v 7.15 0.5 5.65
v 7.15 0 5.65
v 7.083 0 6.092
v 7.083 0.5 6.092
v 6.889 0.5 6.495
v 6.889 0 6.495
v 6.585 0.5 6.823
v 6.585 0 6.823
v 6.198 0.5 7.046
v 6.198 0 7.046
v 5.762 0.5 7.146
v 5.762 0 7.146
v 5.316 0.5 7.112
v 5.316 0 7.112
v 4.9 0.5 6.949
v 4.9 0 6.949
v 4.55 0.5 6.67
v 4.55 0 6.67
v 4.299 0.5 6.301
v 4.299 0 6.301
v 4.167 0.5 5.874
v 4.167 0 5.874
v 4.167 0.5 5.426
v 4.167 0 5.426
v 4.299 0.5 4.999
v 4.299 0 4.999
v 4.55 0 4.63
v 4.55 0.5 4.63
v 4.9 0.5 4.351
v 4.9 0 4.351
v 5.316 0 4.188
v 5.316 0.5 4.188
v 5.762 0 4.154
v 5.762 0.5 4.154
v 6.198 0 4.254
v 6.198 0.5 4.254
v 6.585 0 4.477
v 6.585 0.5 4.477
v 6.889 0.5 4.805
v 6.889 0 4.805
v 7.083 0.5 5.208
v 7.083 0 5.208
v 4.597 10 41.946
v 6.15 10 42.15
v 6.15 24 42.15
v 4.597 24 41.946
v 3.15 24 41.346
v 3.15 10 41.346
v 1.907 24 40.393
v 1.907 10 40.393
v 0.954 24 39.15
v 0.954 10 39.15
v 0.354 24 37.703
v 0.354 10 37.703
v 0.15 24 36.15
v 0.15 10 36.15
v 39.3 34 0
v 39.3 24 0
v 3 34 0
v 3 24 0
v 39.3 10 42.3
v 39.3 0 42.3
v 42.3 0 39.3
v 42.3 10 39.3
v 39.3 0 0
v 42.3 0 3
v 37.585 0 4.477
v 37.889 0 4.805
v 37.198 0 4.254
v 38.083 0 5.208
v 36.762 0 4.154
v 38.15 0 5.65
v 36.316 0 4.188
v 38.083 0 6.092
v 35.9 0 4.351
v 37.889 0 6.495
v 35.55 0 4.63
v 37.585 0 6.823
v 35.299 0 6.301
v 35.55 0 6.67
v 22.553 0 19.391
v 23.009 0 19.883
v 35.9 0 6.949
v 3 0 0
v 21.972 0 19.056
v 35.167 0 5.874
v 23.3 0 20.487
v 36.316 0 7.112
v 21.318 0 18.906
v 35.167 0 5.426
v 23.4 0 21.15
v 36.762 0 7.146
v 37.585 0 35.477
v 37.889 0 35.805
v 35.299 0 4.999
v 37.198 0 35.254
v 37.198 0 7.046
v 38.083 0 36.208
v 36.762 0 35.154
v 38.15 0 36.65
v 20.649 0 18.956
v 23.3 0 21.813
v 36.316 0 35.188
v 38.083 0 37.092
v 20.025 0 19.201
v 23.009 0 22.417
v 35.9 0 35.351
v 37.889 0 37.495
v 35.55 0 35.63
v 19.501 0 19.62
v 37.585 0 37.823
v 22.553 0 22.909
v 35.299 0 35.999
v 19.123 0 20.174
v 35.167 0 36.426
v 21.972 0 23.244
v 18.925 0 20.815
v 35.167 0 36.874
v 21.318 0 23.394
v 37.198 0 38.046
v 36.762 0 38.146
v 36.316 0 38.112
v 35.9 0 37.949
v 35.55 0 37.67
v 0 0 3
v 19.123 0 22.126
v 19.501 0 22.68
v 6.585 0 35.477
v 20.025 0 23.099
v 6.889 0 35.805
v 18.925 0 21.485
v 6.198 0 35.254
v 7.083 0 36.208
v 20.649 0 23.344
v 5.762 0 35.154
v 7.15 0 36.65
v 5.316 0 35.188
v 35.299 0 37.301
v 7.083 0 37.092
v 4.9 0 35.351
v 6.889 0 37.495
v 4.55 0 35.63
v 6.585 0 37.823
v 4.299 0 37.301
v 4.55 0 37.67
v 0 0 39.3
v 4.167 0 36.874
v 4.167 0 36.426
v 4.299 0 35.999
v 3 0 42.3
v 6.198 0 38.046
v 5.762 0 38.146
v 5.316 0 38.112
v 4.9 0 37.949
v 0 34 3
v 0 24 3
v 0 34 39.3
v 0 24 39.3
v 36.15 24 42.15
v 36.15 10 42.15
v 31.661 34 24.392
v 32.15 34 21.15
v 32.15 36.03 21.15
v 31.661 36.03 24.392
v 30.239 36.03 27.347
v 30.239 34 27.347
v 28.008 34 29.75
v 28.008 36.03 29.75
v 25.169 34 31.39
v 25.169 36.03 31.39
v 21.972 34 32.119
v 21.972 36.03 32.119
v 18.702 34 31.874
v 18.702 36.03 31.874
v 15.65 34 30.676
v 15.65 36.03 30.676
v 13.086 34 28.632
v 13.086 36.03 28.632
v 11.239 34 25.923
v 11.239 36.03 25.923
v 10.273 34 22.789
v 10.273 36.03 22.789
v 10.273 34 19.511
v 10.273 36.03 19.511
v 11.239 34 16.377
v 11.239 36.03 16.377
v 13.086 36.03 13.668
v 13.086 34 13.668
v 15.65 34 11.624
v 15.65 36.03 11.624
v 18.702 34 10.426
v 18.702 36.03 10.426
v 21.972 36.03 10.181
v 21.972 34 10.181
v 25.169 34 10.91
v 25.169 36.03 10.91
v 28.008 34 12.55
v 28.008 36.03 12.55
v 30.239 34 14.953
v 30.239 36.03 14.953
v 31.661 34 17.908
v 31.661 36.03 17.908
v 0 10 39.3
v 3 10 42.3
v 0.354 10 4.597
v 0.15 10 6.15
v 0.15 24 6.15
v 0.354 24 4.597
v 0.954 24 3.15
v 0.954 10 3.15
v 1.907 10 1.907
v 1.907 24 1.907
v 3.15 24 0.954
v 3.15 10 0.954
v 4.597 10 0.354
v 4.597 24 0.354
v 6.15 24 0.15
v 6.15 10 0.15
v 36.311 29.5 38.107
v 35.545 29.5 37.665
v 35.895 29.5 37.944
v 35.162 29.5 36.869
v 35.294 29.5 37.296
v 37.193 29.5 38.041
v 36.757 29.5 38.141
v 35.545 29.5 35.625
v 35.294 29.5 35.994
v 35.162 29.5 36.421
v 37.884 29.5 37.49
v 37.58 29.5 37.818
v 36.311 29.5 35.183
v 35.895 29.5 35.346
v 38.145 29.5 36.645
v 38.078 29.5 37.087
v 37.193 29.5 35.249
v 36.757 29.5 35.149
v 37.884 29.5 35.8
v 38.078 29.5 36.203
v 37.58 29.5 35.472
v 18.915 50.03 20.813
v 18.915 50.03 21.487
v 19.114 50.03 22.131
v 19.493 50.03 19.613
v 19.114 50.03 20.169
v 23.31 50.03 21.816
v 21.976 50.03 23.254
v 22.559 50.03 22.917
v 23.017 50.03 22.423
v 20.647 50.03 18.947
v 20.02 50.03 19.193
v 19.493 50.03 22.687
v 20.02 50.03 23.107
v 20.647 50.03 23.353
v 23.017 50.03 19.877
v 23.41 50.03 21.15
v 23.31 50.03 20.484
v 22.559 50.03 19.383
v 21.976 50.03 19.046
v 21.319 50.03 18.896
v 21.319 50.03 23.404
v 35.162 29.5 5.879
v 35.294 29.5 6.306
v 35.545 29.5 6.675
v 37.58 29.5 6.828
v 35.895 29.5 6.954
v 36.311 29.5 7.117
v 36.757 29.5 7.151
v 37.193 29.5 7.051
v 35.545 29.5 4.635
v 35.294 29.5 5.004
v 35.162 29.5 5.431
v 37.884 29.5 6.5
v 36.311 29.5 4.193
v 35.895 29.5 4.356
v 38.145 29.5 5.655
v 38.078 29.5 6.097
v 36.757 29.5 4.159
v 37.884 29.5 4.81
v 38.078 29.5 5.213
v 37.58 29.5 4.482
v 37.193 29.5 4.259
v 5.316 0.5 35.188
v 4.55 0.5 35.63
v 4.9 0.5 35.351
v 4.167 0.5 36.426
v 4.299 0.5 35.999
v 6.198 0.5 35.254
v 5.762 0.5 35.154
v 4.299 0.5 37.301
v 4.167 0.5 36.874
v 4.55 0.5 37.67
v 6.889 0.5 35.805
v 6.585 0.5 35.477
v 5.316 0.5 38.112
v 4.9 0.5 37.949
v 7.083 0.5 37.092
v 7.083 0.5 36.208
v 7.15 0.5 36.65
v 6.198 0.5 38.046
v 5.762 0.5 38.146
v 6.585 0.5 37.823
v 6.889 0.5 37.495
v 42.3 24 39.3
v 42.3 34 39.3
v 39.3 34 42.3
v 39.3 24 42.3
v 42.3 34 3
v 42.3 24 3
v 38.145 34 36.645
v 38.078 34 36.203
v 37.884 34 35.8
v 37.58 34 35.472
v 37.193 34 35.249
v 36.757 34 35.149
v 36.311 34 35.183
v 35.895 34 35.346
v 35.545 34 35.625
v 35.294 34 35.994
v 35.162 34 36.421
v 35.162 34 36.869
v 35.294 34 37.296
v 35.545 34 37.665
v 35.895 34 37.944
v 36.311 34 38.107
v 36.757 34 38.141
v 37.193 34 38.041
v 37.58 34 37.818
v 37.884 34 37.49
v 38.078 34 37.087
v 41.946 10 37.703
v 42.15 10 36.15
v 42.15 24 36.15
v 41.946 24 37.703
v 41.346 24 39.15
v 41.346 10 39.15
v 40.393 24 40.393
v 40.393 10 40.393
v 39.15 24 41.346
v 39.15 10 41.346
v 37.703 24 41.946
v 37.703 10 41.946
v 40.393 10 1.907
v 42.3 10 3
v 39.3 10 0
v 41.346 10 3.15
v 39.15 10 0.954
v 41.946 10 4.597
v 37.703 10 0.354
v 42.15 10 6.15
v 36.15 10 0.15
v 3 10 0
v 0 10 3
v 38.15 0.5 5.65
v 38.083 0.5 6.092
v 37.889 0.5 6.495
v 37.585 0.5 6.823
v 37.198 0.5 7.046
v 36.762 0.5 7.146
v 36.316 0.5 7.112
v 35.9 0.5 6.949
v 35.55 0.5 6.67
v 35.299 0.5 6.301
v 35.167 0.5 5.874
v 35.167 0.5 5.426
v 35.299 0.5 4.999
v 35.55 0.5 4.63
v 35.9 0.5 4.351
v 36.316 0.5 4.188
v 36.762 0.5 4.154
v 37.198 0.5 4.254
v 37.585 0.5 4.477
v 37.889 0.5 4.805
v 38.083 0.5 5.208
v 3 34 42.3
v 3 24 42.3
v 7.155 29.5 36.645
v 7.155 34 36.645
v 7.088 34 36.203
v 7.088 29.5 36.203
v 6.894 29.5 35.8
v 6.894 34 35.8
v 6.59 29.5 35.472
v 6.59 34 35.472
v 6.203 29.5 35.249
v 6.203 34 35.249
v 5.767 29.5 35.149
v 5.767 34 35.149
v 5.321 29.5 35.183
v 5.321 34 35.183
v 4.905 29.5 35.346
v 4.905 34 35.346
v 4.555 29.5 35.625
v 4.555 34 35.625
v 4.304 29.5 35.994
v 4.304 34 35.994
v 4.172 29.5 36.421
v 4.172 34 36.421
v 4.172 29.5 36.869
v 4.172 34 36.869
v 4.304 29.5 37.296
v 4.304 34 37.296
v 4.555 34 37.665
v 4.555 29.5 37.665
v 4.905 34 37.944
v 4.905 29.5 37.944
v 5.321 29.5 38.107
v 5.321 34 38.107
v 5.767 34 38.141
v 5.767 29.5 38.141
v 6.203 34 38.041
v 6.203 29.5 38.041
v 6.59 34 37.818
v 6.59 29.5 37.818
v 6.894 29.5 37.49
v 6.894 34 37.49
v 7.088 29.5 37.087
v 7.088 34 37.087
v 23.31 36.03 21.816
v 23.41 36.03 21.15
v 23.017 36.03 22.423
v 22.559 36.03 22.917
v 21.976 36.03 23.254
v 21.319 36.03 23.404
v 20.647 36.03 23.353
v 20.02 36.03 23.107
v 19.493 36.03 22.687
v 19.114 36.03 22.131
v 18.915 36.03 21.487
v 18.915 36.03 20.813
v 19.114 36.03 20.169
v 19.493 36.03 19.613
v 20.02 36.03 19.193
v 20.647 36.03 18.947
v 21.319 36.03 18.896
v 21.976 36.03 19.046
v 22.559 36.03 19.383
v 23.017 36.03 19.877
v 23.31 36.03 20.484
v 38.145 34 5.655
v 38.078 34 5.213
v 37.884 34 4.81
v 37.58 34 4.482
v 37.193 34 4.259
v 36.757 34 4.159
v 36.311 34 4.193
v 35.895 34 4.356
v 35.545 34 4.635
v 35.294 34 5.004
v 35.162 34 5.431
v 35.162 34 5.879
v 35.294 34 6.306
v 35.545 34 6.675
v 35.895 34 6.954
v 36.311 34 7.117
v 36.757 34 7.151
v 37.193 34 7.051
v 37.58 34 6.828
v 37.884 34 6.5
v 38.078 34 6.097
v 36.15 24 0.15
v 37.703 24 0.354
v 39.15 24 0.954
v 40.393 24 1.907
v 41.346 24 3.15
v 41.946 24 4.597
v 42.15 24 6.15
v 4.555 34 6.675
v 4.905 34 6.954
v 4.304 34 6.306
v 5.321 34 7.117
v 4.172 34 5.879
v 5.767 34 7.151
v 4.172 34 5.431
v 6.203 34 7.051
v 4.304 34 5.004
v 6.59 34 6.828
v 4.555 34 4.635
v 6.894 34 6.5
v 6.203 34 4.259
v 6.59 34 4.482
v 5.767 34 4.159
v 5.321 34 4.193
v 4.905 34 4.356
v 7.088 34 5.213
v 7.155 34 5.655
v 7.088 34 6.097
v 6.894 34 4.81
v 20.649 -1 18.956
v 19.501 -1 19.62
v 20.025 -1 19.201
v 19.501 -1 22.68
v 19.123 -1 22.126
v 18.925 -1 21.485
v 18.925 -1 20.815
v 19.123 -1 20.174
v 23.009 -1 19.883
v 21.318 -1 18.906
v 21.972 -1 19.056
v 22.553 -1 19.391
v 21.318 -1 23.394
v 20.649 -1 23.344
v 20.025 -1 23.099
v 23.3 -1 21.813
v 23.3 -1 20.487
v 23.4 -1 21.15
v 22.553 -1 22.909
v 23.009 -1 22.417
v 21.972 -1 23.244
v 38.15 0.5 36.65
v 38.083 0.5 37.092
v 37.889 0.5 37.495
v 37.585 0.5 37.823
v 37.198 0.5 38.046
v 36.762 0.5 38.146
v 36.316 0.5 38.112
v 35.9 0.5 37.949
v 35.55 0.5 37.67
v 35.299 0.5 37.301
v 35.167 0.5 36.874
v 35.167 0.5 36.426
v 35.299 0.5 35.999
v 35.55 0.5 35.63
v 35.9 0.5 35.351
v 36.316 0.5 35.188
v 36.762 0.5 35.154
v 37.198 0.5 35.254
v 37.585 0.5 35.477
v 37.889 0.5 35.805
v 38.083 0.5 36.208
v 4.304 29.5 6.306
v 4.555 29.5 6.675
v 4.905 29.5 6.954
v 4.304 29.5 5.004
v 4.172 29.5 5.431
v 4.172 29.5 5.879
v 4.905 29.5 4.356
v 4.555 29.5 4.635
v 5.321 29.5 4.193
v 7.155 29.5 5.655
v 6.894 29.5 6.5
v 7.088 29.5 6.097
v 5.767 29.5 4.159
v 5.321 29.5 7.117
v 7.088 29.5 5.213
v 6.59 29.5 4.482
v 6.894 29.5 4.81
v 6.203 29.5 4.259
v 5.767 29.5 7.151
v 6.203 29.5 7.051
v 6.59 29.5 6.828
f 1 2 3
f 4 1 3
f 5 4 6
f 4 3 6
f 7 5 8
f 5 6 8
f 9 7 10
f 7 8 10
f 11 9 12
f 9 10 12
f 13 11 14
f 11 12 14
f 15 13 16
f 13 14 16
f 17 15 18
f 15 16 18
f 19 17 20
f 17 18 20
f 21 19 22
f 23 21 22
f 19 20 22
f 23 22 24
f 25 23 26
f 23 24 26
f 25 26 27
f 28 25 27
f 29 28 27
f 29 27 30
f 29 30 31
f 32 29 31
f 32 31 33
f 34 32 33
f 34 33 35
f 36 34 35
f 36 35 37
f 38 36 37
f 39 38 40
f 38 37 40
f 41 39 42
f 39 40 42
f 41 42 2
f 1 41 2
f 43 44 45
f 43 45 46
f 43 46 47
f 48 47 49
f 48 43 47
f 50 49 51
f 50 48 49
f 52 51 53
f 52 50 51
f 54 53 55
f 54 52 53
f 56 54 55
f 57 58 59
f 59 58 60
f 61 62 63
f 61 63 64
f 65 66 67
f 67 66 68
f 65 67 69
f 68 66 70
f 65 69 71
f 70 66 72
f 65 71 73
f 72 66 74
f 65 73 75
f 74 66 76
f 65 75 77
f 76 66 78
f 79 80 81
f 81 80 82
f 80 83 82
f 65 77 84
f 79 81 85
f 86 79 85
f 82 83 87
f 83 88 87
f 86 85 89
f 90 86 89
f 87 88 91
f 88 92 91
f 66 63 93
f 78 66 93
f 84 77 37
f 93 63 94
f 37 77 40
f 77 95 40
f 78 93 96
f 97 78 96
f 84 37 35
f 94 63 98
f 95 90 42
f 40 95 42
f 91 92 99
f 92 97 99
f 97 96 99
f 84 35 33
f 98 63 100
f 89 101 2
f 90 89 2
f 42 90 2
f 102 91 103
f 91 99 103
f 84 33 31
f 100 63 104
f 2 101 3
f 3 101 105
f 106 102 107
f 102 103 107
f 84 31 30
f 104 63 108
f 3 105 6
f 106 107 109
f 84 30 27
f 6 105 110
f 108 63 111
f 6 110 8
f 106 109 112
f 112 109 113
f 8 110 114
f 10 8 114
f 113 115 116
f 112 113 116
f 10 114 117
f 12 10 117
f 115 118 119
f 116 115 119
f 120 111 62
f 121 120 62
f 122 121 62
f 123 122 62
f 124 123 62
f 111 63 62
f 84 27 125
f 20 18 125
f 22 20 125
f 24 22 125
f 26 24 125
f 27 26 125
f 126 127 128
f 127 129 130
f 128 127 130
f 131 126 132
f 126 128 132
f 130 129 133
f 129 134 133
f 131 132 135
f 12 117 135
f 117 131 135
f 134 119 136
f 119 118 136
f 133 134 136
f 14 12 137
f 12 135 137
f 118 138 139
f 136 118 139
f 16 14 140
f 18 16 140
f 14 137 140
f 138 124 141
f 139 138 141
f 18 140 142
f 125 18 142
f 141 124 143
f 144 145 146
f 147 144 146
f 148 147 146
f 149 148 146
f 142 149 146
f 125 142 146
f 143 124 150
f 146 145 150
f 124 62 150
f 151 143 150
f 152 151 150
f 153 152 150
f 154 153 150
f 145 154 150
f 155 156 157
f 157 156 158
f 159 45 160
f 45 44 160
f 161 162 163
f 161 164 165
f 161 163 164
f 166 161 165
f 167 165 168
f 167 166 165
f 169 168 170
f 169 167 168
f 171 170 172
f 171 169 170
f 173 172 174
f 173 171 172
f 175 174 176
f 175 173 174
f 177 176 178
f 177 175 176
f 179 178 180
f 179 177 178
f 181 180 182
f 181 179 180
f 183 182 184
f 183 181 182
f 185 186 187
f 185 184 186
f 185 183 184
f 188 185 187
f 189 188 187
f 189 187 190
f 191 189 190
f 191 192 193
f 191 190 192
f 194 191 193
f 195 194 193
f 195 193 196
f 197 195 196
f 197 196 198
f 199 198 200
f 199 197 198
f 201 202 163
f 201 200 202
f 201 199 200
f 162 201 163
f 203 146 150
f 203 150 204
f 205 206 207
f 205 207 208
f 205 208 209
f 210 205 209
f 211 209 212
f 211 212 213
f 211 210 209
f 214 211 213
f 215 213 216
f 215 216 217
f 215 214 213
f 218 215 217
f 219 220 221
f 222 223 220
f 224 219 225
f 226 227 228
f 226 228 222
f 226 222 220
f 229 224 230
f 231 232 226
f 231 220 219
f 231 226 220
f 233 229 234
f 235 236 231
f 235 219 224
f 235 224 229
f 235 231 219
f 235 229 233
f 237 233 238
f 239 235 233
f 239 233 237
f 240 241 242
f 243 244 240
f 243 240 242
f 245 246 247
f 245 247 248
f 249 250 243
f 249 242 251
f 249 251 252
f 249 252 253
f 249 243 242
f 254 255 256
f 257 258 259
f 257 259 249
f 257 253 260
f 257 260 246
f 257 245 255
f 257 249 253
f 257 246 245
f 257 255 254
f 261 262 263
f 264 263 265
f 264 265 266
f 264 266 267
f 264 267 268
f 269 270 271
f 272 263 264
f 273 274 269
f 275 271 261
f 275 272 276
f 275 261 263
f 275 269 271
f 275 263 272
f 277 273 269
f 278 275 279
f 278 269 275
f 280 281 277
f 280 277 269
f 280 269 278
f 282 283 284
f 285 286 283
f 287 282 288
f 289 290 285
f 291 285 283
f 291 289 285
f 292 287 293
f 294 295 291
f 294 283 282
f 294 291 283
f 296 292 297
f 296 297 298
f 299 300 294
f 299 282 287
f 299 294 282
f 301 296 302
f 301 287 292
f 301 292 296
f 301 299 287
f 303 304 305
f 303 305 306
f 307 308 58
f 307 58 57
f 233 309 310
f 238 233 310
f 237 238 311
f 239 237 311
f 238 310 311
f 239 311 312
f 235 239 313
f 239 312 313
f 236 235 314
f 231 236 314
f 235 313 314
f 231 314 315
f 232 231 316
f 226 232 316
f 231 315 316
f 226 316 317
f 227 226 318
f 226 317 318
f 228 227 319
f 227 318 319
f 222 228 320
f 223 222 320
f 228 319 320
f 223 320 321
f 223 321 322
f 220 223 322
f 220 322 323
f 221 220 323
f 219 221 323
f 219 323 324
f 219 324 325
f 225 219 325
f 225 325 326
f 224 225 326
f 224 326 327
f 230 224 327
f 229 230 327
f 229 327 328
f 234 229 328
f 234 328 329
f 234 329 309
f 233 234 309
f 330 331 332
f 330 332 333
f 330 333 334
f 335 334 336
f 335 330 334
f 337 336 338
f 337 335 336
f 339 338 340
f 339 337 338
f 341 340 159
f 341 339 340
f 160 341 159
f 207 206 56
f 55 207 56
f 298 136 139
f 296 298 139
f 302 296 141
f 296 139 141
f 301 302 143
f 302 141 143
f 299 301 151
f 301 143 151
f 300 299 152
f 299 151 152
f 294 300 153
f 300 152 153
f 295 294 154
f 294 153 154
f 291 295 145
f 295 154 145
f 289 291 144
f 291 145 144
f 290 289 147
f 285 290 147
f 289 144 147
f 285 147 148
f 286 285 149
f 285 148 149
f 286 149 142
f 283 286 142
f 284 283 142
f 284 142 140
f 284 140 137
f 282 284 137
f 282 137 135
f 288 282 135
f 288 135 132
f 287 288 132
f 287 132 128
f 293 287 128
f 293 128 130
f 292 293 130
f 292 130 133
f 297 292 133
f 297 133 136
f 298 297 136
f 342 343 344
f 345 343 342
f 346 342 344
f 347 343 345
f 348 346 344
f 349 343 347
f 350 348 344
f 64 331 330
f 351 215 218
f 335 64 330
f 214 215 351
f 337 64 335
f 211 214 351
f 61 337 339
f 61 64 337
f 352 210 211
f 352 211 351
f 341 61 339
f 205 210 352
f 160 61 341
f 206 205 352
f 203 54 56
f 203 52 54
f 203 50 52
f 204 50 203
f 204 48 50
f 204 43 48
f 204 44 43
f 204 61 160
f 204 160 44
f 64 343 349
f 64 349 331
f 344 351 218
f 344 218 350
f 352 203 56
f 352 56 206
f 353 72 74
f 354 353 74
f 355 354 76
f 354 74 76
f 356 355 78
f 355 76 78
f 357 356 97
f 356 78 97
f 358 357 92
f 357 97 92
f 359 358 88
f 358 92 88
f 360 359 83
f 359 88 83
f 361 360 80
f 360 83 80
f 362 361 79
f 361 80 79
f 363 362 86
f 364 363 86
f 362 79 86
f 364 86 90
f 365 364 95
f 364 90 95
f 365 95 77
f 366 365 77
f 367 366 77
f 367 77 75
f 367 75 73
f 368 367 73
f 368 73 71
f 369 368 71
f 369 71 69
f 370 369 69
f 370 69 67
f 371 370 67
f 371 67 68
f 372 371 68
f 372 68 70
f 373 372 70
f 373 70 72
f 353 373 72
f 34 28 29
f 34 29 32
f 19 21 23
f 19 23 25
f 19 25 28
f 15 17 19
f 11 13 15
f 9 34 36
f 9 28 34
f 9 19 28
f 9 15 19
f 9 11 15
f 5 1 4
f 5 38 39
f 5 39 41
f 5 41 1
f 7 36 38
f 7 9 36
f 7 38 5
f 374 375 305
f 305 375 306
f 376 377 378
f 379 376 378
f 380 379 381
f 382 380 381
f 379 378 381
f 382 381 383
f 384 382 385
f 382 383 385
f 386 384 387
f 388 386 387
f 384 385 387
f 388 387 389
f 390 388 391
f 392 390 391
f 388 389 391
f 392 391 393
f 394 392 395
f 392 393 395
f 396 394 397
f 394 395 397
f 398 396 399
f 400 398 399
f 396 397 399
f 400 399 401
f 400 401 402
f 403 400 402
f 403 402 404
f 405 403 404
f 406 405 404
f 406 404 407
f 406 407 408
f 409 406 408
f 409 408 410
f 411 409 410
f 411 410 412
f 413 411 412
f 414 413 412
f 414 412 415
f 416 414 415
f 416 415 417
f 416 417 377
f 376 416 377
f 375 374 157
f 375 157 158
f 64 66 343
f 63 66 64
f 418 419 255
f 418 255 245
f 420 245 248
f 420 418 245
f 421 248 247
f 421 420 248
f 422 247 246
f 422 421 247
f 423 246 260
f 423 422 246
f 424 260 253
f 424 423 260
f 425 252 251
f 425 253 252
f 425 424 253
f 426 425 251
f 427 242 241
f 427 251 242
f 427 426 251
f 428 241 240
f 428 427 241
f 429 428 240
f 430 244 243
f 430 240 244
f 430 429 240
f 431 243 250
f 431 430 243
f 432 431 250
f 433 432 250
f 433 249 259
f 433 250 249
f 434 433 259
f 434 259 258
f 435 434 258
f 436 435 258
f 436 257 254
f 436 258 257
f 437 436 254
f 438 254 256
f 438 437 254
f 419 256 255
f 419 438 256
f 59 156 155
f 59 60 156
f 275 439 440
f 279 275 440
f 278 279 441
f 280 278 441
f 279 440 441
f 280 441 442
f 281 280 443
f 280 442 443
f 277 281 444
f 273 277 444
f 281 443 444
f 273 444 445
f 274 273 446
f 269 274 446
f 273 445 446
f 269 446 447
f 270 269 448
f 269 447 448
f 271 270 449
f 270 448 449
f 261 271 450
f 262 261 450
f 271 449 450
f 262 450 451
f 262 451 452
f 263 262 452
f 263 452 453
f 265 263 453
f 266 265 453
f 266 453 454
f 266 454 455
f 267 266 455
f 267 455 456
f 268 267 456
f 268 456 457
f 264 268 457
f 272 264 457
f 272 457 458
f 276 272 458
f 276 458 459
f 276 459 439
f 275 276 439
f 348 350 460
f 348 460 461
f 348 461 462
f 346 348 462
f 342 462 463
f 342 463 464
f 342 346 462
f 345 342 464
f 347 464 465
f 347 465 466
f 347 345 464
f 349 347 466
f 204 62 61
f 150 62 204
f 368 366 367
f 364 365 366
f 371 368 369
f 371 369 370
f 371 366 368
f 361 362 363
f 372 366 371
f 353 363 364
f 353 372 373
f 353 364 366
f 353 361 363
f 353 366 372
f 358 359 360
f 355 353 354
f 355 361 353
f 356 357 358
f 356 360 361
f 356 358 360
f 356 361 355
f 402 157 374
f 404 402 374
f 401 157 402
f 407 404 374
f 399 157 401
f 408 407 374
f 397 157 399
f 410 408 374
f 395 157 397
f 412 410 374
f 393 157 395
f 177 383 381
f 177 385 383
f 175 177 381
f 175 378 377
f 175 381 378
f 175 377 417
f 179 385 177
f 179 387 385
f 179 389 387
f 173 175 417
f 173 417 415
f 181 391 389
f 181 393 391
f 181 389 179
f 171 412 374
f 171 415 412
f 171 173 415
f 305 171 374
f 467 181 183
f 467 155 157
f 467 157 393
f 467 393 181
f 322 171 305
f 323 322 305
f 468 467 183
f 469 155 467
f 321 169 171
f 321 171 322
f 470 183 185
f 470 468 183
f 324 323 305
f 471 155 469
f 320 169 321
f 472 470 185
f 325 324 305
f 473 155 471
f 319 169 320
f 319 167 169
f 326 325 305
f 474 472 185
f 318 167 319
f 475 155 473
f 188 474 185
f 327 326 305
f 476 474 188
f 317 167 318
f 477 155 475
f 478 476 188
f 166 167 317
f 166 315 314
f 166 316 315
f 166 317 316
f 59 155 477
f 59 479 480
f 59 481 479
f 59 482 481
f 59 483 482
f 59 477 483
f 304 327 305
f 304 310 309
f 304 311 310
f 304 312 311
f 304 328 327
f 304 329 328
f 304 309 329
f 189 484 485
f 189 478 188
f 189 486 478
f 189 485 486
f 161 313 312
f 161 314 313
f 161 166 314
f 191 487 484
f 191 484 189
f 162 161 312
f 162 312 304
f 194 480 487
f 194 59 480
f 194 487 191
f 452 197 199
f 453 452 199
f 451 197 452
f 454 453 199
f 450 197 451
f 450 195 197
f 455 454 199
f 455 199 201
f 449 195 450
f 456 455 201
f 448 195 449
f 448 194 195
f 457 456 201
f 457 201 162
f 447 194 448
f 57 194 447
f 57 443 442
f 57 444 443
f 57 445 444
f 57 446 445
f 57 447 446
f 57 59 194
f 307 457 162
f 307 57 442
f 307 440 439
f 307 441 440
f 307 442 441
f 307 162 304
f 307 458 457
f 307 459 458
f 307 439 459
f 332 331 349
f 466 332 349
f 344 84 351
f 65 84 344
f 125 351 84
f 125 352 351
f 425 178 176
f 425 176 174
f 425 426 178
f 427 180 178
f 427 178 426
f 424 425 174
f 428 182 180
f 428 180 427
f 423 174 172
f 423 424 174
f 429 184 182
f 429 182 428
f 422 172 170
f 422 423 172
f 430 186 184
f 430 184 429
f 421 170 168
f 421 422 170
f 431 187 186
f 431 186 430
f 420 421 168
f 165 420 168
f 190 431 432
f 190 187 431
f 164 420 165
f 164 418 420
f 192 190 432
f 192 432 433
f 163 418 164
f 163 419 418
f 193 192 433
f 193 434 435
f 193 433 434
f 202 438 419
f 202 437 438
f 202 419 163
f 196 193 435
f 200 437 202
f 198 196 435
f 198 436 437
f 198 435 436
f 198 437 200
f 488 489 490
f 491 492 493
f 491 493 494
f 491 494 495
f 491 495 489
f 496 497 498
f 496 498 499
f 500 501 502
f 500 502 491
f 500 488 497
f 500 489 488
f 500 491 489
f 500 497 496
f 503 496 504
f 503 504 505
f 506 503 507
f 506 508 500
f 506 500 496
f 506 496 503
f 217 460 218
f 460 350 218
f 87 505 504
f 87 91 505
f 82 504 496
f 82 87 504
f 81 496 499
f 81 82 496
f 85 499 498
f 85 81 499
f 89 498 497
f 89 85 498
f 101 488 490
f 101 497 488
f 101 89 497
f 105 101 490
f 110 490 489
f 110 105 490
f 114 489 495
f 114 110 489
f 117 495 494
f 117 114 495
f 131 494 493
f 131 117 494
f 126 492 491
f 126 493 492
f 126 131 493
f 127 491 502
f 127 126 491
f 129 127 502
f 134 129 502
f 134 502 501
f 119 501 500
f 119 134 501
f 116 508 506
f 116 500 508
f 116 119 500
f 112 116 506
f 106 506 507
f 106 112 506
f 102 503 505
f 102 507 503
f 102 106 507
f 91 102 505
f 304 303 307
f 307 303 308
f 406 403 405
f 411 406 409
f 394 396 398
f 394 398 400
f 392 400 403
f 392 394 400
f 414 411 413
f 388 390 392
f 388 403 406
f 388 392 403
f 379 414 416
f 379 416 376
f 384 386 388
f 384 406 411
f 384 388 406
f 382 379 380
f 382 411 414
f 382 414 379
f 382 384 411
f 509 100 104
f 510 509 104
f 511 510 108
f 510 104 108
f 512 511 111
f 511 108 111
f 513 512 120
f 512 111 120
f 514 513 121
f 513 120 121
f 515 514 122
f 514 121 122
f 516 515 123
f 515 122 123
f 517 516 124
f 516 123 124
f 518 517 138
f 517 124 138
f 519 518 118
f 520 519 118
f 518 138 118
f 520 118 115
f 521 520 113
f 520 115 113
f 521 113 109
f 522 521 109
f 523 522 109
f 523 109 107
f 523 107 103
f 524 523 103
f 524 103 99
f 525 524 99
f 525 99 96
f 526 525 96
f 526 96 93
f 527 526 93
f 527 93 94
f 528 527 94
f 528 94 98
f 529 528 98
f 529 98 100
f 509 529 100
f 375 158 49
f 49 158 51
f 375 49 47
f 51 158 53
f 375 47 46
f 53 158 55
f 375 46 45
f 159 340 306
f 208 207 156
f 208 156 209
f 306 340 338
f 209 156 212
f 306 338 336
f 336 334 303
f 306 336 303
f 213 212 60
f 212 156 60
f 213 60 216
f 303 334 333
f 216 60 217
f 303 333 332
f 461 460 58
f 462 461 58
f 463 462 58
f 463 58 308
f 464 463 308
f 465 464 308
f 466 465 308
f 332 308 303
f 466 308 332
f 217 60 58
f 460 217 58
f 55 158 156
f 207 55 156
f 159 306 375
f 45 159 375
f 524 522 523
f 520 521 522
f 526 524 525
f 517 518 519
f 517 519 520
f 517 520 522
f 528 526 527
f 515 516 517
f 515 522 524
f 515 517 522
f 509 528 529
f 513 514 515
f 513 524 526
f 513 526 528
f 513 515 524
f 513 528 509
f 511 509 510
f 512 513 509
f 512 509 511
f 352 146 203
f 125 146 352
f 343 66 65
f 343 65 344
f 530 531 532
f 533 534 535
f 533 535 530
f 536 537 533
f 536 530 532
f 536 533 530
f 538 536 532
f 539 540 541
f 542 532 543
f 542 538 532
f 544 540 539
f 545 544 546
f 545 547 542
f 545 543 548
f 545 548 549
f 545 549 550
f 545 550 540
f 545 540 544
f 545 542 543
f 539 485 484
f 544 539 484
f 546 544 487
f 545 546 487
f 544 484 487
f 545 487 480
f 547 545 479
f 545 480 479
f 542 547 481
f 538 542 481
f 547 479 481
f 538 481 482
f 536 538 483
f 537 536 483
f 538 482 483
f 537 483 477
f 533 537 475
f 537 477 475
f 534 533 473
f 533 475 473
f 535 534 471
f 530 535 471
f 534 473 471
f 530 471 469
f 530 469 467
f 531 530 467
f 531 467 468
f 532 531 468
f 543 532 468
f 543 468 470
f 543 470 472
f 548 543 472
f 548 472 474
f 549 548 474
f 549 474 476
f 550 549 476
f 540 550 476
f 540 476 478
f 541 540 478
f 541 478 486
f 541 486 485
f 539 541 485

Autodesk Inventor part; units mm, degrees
ref_plane "YZ Plane" through (0, 0, 0) normal (1, 0, 0) x (0, 1, 0)
ref_plane "XZ Plane" through (0, 0, 0) normal (0, 1, 0) x (-1, 0, 0)
sketch "Sketch1" plane through (0, 0, 0) normal (0, 1, 0) x (-1, 0, 0)
  line L0 (0, 0) -> (-42.3, 0)
  line L1 (-42.3, 0) -> (-42.3, 42.3)
  line L2 (-42.3, 42.3) -> (0, 42.3)
  line L3 (0, 42.3) -> (0, 0)
  dimension "d0" = 42.3
  dimension "d1" = 42.3
extrude "Extrusion1" add sketch "Sketch1" along normal blind 10
chamfer "Chamfer1" distance 3 angle 45 4 edges at (42.3, 5, 42.3) (0, 5, 42.3) (0, 5, 0) (42.3, 5, 0)
sketch "Sketch2" plane through (0, 10, 0) normal (0, 1, 0) x (1, 0, 0)
  line L0 (0.15, -42.15) -> (42.15, -42.15)
  line L1 (42.15, -42.15) -> (42.15, -0.15)
  line L2 (42.15, -0.15) -> (0.15, -0.15)
  line L3 (0.15, -0.15) -> (0.15, -42.15)
  line L4 (0.15, -42.15) -> (42.15, -0.15) construction
  line L5 (42.15, -42.15) -> (0.15, -0.15) construction
  point P0 (0, 0)
  point P1 (21.15, -21.15)
  dimension "d7" = 42
  dimension "d8" = 42
extrude "Extrusion2" add sketch "Sketch2" along normal blind 14
fillet "Fillet1" radius 6 4 edges at (42.15, 17, 42.15) (42.15, 17, 0.15) (0.15, 17, 42.15) (0.15, 17, 0.15)
sketch "Sketch3" plane through (0, 24, 0) normal (0, 1, 0) x (1, 0, 0)
  line L0 (0, -42.3) -> (42.3, -42.3)
  line L1 (42.3, -42.3) -> (42.3, 0)
  line L2 (42.3, 0) -> (0, 0)
  line L3 (0, 0) -> (0, -42.3)
  line L4 (0, -42.3) -> (42.3, 0) construction
  line L5 (42.3, -42.3) -> (0, 0) construction
  point P0 (0, 0)
  point P1 (21.15, -21.15)
  dimension "d12" = 42.3
  dimension "d13" = 42.3
extrude "Extrusion3" add sketch "Sketch3" along normal blind 10
chamfer "Chamfer2" distance 3 angle 45 4 edges at (42.3, 29, 42.3) (42.3, 29, 0) (0, 29, 0) (0, 29, 42.3)
ref_plane "Work Plane1" through (39.3, 0, 21.15) normal (0, 0, -1) x (-1, 0, 0)
sketch "Sketch4" plane through (0, 34, 0) normal (0, 1, 0) x (1, 0, 0)
  circle A0 centre (21.15, -21.15) radius 11
  point P0 (0, 0)
  dimension "d19" = 22
extrude "Extrusion4" add sketch "Sketch4" along normal blind 2.03
sketch "Sketch5" plane through (21.15, 36.03, 21.15) normal (0, 1, 0) x (1, 0, 0)
  circle A0 centre (0, 0) radius 11 projected
  circle A1 centre (0, 0) radius 2.26
  point P0 (-21.15, 21.15)
  dimension "d22" = 4.52
extrude "Extrusion5" add sketch "Sketch5" along normal blind 14 contours A1
sketch "Sketch6" plane through (0, 34, 0) normal (0, 1, 0) x (1, 0, 0)
  circle A0 centre (21.15, -21.15) radius 11 projected
  line L0 (5.655, -36.645) -> (36.645, -5.655) construction
  line L1 (36.645, -36.645) -> (5.655, -5.655) construction
  circle A1 centre (5.655, -5.655) radius 1.5
  circle A2 centre (36.645, -5.655) radius 1.5
  circle A3 centre (36.645, -36.645) radius 1.5
  circle A4 centre (5.655, -36.645) radius 1.5
  point P0 (0, 0)
  dimension "d25" = 30.99
  dimension "d26" = 30.99
  dimension "d27" = 3
  dimension "d28" = 3
  dimension "d29" = 3
  dimension "d30" = 3
extrude "Extrusion6" cut sketch "Sketch6" against normal blind 4.5 contours A1 | A2 | A3 | A4
thread "Thread1" size "M3x0.5" class "6H" standard "ANSI Metric M Profile" full length
thread "Thread2" size "M3x0.5" class "6H" standard "ANSI Metric M Profile" full length
thread "Thread3" size "M3x0.5" class "6H" standard "ANSI Metric M Profile" full length
thread "Thread4" size "M3x0.5" class "6H" standard "ANSI Metric M Profile" full length
sketch "Sketch7" plane through (0, 0, 0) normal (0, -1, 0) x (1, 0, 0)
  circle A0 centre (21.15, 21.15) radius 2.25
  point P0 (0, 0)
  dimension "d41" = 4.5
extrude "Extrusion7" add sketch "Sketch7" along normal blind 1
sketch "Sketch8" plane through (0, 0, 0) normal (0, -1, 0) x (1, 0, 0)
  line L0 (5.65, 5.65) -> (36.65, 36.65) construction
  line L1 (36.65, 5.65) -> (5.65, 36.65) construction
  circle A0 centre (5.65, 36.65) radius 1.5
  circle A1 centre (36.65, 36.65) radius 1.5
  circle A2 centre (36.65, 5.65) radius 1.5
  circle A3 centre (5.65, 5.65) radius 1.5
  point P0 (0, 0)
  point P1 (21.15, 21.15)
  dimension "d44" = 31
  dimension "d45" = 31
  dimension "d46" = 3
  dimension "d47" = 3
  dimension "d48" = 3
  dimension "d49" = 3
extrude "Extrusion8" cut sketch "Sketch8" against normal blind 0.5
properties part number "NEMA17"
